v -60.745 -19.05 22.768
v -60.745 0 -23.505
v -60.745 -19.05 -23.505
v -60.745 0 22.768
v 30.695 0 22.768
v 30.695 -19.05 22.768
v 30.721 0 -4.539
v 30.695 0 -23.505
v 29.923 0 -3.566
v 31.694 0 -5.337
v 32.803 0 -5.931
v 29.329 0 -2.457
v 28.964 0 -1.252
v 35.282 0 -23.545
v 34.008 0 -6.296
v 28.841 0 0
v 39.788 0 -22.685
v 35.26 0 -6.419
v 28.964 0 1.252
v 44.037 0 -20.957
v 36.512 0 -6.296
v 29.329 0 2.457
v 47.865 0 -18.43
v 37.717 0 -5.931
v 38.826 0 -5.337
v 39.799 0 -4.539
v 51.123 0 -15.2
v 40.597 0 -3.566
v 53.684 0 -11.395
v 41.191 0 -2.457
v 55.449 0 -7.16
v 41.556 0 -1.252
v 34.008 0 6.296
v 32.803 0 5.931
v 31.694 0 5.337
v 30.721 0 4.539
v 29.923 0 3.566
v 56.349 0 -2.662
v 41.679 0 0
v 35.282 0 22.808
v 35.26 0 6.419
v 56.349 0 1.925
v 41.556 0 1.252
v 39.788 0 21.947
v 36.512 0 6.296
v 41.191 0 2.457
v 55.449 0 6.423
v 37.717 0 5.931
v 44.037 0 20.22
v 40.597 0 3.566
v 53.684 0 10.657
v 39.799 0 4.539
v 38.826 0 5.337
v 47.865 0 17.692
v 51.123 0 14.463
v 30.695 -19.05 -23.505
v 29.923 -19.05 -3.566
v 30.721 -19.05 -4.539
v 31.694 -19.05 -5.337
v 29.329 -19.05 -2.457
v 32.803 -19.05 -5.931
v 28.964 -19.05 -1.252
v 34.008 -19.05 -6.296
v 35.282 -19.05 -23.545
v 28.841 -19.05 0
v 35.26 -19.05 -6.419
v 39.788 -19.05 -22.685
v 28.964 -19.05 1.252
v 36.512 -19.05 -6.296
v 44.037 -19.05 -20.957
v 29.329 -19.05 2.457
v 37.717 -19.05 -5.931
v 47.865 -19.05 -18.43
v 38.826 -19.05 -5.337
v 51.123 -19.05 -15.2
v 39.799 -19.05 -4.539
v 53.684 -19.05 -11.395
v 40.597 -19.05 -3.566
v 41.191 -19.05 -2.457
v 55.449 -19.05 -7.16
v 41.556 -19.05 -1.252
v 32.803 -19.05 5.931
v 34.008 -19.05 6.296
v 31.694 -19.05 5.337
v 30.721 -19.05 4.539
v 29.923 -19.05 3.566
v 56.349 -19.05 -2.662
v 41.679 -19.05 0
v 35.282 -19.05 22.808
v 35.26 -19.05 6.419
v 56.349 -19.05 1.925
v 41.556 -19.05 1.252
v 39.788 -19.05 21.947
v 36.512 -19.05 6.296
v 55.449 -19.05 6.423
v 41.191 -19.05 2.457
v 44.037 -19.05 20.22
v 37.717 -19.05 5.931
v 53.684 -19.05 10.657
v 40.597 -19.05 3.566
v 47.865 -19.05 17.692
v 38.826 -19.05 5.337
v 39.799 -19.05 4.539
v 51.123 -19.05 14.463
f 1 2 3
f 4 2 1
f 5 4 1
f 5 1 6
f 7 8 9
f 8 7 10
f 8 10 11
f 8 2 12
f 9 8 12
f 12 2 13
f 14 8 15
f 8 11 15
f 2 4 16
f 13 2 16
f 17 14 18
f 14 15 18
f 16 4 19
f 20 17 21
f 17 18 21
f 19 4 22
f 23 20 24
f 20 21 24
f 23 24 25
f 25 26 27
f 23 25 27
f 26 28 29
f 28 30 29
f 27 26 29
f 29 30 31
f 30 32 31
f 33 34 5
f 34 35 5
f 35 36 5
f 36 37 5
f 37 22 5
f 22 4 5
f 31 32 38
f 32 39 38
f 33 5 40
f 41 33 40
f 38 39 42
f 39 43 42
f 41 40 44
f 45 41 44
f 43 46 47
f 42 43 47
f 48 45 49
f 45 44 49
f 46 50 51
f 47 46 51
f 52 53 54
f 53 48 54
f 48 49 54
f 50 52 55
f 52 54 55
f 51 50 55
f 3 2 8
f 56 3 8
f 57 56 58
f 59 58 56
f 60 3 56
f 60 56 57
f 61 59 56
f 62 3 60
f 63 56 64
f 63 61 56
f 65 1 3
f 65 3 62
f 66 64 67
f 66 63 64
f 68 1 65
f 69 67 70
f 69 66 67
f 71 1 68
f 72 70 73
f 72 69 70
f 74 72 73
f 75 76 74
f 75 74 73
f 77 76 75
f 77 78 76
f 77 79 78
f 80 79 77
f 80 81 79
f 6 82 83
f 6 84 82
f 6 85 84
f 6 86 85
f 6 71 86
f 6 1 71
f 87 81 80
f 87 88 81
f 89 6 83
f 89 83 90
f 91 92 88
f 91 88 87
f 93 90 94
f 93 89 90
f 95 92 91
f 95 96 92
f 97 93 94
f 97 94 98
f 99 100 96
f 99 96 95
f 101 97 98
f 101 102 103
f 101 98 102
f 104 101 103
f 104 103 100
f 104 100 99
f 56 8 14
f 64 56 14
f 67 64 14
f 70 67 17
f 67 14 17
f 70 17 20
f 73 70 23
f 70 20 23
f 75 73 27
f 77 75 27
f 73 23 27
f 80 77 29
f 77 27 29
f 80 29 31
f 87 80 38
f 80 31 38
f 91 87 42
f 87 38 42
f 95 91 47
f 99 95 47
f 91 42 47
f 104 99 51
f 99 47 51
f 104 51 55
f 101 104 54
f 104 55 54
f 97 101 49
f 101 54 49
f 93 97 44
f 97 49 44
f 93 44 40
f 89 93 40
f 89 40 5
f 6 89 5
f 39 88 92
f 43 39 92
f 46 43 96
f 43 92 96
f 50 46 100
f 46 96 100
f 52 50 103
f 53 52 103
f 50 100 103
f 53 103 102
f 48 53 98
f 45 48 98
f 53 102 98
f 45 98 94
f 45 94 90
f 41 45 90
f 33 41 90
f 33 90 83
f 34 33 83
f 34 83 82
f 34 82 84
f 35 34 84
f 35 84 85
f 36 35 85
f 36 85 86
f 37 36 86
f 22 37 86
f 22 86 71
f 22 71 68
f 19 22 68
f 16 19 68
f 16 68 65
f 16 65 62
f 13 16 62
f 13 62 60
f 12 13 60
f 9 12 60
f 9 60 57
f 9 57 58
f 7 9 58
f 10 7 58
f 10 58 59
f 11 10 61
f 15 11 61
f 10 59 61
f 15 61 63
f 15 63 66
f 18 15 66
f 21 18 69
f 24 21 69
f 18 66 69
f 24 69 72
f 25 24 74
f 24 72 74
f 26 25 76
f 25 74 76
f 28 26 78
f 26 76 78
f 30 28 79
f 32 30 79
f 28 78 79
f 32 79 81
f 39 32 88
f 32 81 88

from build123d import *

# Parameters (mm, degrees)
F0_W     = 91.440002
F0_H     = 46.273064
F1_DEPTH = 19.05
F2_R     = 6.419279
F3_DEPTH = 70.358


with BuildPart() as f1:
    # F0 (on Front) → F1 (new body)
    with BuildSketch(Plane.XZ):
        with Locations((-15.024918, -0.368711)):
            Rectangle(F0_W, F0_H)
        with BuildLine():
            Line((30.695083, 22.767821), (30.695083, -23.505243))
            ThreePointArc((30.695083, -23.505243), (56.461966, -0.368711), (30.695083, 22.767821))
        make_face()
    extrude(amount=F1_DEPTH)

    # F2 (on face) → F3 (cut)
    with BuildSketch(Plane.XZ.offset(19.05)):
        with Locations((35.259977, 0)):
            Circle(F2_R)
    extrude(amount=-F3_DEPTH, mode=Mode.SUBTRACT)


solid = f1.part
